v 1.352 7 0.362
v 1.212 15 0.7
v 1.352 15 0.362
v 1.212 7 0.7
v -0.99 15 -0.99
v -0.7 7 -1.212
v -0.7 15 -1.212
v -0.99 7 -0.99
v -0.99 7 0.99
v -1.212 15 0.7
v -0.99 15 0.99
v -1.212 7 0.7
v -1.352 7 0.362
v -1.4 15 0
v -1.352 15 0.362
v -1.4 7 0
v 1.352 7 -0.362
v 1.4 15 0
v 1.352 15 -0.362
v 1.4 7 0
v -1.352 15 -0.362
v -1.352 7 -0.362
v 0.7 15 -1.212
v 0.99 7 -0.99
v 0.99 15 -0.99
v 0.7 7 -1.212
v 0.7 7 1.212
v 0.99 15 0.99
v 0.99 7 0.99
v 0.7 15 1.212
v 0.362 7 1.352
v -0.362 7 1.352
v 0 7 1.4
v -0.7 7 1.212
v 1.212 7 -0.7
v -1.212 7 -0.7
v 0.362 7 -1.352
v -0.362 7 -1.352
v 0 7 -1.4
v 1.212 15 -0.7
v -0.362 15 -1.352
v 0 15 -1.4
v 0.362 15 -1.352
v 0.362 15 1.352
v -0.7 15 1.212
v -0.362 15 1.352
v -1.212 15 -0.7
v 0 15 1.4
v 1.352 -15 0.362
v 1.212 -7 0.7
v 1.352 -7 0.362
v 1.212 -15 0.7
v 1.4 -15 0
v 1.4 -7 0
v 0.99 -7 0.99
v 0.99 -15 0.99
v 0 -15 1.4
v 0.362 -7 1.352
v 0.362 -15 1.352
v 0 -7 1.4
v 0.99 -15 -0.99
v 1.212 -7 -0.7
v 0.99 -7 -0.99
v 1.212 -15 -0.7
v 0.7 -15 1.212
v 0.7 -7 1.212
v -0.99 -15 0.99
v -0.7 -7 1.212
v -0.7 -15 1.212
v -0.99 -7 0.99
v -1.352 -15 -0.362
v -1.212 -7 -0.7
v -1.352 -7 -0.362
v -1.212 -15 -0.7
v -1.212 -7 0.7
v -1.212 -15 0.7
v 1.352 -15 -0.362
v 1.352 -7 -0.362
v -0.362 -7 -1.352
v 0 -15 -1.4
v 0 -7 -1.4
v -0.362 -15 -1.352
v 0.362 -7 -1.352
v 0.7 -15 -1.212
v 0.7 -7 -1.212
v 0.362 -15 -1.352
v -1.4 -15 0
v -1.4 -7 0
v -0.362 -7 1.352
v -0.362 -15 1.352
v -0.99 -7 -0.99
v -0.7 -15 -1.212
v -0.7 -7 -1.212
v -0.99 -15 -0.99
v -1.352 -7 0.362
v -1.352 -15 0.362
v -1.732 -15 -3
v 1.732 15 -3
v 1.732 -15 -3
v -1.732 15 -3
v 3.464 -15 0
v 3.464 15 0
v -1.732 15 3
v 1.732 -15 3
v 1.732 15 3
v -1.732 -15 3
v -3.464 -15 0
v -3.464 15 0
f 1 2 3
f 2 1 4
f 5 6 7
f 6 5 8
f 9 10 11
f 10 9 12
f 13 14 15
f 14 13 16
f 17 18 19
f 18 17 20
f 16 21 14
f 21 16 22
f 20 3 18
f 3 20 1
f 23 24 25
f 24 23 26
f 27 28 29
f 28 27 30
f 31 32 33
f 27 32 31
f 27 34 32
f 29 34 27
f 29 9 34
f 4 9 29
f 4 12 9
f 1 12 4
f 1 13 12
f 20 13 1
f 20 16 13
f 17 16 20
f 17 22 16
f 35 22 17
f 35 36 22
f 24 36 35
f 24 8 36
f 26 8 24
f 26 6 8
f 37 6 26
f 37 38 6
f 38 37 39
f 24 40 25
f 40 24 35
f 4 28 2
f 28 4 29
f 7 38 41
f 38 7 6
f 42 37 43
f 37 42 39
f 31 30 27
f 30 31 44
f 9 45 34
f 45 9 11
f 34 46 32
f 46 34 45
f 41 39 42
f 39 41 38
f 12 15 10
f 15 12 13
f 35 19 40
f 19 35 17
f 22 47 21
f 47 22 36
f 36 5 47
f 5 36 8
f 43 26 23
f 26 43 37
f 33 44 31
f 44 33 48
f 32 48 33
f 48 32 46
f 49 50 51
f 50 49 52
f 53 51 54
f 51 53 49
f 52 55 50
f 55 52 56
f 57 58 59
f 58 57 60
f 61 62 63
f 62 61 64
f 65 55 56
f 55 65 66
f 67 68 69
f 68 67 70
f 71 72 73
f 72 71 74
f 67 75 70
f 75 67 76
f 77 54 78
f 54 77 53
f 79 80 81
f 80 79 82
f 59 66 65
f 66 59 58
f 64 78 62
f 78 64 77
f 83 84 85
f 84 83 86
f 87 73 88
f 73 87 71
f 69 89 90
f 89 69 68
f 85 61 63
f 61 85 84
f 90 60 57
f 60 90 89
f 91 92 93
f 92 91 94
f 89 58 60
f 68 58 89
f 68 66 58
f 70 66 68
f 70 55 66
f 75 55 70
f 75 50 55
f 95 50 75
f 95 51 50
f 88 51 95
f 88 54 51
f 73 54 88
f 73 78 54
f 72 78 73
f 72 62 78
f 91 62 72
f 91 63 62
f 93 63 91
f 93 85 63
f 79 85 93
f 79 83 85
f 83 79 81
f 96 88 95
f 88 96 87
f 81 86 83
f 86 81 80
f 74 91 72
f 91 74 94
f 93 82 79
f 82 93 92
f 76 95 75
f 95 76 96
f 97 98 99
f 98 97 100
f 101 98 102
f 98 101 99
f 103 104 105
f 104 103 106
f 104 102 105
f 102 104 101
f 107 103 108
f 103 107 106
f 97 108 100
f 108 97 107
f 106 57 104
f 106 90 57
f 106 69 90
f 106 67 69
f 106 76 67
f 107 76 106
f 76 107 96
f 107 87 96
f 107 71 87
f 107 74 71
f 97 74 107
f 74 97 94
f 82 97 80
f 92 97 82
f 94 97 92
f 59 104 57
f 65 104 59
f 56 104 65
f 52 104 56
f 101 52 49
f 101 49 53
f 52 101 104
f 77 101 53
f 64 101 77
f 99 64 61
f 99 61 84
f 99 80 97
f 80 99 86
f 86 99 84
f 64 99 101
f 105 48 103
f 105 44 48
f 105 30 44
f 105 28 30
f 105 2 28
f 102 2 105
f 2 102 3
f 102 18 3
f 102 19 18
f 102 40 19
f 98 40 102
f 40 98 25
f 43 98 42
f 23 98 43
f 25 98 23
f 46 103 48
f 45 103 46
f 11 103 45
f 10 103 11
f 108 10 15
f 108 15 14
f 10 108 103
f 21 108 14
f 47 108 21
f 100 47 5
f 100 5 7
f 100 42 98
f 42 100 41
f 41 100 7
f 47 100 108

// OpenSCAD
// Protoloura <PlatSpacer.scad>
//
// Copyright (c) 2014 Xoan Sampaiño
//
// Permission is hereby granted, free of charge, to any person obtaining
// a copy of this software and associated documentation files (the
// "Software"), to deal in the Software without restriction, including
// without limitation the rights to use, copy, modify, merge, publish,
// distribute, sublicense, and/or sell copies of the Software, and to
// permit persons to whom the Software is furnished to do so, subject to
// the following conditions:
// 
// The above copyright notice and this permission notice shall be included
// in all copies or substantial portions of the Software.
//
// THE SOFTWARE IS PROVIDED "AS IS", WITHOUT WARRANTY OF ANY KIND,
// EXPRESS OR IMPLIED, INCLUDING BUT NOT LIMITED TO THE WARRANTIES OF
// MERCHANTABILITY, FITNESS FOR A PARTICULAR PURPOSE AND NONINFRINGEMENT.
// IN NO EVENT SHALL THE AUTHORS OR COPYRIGHT HOLDERS BE LIABLE FOR ANY
// CLAIM, DAMAGES OR OTHER LIABILITY, WHETHER IN AN ACTION OF CONTRACT,
// TORT OR OTHERWISE, ARISING FROM, OUT OF OR IN CONNECTION WITH THE
// SOFTWARE OR THE USE OR OTHER DEALINGS IN THE SOFTWARE.

spanner = 6;
screw = 3;
height = 30;
depth = 8;

module spacer(sp = spanner, sc = screw, h = height, d = depth) {
  difference() {
    cylinder(r = sp/2/sin(60), h = h, $fn = 6, center = true);
    for (i = [1,-1])
      translate([0,0,-i*h/2+i*d/2-i])
        cylinder(r = (sc-0.2)/2, h = d+2, center = true, $fn = 24);
  }
}

rotate([90,0,0]) spacer();
